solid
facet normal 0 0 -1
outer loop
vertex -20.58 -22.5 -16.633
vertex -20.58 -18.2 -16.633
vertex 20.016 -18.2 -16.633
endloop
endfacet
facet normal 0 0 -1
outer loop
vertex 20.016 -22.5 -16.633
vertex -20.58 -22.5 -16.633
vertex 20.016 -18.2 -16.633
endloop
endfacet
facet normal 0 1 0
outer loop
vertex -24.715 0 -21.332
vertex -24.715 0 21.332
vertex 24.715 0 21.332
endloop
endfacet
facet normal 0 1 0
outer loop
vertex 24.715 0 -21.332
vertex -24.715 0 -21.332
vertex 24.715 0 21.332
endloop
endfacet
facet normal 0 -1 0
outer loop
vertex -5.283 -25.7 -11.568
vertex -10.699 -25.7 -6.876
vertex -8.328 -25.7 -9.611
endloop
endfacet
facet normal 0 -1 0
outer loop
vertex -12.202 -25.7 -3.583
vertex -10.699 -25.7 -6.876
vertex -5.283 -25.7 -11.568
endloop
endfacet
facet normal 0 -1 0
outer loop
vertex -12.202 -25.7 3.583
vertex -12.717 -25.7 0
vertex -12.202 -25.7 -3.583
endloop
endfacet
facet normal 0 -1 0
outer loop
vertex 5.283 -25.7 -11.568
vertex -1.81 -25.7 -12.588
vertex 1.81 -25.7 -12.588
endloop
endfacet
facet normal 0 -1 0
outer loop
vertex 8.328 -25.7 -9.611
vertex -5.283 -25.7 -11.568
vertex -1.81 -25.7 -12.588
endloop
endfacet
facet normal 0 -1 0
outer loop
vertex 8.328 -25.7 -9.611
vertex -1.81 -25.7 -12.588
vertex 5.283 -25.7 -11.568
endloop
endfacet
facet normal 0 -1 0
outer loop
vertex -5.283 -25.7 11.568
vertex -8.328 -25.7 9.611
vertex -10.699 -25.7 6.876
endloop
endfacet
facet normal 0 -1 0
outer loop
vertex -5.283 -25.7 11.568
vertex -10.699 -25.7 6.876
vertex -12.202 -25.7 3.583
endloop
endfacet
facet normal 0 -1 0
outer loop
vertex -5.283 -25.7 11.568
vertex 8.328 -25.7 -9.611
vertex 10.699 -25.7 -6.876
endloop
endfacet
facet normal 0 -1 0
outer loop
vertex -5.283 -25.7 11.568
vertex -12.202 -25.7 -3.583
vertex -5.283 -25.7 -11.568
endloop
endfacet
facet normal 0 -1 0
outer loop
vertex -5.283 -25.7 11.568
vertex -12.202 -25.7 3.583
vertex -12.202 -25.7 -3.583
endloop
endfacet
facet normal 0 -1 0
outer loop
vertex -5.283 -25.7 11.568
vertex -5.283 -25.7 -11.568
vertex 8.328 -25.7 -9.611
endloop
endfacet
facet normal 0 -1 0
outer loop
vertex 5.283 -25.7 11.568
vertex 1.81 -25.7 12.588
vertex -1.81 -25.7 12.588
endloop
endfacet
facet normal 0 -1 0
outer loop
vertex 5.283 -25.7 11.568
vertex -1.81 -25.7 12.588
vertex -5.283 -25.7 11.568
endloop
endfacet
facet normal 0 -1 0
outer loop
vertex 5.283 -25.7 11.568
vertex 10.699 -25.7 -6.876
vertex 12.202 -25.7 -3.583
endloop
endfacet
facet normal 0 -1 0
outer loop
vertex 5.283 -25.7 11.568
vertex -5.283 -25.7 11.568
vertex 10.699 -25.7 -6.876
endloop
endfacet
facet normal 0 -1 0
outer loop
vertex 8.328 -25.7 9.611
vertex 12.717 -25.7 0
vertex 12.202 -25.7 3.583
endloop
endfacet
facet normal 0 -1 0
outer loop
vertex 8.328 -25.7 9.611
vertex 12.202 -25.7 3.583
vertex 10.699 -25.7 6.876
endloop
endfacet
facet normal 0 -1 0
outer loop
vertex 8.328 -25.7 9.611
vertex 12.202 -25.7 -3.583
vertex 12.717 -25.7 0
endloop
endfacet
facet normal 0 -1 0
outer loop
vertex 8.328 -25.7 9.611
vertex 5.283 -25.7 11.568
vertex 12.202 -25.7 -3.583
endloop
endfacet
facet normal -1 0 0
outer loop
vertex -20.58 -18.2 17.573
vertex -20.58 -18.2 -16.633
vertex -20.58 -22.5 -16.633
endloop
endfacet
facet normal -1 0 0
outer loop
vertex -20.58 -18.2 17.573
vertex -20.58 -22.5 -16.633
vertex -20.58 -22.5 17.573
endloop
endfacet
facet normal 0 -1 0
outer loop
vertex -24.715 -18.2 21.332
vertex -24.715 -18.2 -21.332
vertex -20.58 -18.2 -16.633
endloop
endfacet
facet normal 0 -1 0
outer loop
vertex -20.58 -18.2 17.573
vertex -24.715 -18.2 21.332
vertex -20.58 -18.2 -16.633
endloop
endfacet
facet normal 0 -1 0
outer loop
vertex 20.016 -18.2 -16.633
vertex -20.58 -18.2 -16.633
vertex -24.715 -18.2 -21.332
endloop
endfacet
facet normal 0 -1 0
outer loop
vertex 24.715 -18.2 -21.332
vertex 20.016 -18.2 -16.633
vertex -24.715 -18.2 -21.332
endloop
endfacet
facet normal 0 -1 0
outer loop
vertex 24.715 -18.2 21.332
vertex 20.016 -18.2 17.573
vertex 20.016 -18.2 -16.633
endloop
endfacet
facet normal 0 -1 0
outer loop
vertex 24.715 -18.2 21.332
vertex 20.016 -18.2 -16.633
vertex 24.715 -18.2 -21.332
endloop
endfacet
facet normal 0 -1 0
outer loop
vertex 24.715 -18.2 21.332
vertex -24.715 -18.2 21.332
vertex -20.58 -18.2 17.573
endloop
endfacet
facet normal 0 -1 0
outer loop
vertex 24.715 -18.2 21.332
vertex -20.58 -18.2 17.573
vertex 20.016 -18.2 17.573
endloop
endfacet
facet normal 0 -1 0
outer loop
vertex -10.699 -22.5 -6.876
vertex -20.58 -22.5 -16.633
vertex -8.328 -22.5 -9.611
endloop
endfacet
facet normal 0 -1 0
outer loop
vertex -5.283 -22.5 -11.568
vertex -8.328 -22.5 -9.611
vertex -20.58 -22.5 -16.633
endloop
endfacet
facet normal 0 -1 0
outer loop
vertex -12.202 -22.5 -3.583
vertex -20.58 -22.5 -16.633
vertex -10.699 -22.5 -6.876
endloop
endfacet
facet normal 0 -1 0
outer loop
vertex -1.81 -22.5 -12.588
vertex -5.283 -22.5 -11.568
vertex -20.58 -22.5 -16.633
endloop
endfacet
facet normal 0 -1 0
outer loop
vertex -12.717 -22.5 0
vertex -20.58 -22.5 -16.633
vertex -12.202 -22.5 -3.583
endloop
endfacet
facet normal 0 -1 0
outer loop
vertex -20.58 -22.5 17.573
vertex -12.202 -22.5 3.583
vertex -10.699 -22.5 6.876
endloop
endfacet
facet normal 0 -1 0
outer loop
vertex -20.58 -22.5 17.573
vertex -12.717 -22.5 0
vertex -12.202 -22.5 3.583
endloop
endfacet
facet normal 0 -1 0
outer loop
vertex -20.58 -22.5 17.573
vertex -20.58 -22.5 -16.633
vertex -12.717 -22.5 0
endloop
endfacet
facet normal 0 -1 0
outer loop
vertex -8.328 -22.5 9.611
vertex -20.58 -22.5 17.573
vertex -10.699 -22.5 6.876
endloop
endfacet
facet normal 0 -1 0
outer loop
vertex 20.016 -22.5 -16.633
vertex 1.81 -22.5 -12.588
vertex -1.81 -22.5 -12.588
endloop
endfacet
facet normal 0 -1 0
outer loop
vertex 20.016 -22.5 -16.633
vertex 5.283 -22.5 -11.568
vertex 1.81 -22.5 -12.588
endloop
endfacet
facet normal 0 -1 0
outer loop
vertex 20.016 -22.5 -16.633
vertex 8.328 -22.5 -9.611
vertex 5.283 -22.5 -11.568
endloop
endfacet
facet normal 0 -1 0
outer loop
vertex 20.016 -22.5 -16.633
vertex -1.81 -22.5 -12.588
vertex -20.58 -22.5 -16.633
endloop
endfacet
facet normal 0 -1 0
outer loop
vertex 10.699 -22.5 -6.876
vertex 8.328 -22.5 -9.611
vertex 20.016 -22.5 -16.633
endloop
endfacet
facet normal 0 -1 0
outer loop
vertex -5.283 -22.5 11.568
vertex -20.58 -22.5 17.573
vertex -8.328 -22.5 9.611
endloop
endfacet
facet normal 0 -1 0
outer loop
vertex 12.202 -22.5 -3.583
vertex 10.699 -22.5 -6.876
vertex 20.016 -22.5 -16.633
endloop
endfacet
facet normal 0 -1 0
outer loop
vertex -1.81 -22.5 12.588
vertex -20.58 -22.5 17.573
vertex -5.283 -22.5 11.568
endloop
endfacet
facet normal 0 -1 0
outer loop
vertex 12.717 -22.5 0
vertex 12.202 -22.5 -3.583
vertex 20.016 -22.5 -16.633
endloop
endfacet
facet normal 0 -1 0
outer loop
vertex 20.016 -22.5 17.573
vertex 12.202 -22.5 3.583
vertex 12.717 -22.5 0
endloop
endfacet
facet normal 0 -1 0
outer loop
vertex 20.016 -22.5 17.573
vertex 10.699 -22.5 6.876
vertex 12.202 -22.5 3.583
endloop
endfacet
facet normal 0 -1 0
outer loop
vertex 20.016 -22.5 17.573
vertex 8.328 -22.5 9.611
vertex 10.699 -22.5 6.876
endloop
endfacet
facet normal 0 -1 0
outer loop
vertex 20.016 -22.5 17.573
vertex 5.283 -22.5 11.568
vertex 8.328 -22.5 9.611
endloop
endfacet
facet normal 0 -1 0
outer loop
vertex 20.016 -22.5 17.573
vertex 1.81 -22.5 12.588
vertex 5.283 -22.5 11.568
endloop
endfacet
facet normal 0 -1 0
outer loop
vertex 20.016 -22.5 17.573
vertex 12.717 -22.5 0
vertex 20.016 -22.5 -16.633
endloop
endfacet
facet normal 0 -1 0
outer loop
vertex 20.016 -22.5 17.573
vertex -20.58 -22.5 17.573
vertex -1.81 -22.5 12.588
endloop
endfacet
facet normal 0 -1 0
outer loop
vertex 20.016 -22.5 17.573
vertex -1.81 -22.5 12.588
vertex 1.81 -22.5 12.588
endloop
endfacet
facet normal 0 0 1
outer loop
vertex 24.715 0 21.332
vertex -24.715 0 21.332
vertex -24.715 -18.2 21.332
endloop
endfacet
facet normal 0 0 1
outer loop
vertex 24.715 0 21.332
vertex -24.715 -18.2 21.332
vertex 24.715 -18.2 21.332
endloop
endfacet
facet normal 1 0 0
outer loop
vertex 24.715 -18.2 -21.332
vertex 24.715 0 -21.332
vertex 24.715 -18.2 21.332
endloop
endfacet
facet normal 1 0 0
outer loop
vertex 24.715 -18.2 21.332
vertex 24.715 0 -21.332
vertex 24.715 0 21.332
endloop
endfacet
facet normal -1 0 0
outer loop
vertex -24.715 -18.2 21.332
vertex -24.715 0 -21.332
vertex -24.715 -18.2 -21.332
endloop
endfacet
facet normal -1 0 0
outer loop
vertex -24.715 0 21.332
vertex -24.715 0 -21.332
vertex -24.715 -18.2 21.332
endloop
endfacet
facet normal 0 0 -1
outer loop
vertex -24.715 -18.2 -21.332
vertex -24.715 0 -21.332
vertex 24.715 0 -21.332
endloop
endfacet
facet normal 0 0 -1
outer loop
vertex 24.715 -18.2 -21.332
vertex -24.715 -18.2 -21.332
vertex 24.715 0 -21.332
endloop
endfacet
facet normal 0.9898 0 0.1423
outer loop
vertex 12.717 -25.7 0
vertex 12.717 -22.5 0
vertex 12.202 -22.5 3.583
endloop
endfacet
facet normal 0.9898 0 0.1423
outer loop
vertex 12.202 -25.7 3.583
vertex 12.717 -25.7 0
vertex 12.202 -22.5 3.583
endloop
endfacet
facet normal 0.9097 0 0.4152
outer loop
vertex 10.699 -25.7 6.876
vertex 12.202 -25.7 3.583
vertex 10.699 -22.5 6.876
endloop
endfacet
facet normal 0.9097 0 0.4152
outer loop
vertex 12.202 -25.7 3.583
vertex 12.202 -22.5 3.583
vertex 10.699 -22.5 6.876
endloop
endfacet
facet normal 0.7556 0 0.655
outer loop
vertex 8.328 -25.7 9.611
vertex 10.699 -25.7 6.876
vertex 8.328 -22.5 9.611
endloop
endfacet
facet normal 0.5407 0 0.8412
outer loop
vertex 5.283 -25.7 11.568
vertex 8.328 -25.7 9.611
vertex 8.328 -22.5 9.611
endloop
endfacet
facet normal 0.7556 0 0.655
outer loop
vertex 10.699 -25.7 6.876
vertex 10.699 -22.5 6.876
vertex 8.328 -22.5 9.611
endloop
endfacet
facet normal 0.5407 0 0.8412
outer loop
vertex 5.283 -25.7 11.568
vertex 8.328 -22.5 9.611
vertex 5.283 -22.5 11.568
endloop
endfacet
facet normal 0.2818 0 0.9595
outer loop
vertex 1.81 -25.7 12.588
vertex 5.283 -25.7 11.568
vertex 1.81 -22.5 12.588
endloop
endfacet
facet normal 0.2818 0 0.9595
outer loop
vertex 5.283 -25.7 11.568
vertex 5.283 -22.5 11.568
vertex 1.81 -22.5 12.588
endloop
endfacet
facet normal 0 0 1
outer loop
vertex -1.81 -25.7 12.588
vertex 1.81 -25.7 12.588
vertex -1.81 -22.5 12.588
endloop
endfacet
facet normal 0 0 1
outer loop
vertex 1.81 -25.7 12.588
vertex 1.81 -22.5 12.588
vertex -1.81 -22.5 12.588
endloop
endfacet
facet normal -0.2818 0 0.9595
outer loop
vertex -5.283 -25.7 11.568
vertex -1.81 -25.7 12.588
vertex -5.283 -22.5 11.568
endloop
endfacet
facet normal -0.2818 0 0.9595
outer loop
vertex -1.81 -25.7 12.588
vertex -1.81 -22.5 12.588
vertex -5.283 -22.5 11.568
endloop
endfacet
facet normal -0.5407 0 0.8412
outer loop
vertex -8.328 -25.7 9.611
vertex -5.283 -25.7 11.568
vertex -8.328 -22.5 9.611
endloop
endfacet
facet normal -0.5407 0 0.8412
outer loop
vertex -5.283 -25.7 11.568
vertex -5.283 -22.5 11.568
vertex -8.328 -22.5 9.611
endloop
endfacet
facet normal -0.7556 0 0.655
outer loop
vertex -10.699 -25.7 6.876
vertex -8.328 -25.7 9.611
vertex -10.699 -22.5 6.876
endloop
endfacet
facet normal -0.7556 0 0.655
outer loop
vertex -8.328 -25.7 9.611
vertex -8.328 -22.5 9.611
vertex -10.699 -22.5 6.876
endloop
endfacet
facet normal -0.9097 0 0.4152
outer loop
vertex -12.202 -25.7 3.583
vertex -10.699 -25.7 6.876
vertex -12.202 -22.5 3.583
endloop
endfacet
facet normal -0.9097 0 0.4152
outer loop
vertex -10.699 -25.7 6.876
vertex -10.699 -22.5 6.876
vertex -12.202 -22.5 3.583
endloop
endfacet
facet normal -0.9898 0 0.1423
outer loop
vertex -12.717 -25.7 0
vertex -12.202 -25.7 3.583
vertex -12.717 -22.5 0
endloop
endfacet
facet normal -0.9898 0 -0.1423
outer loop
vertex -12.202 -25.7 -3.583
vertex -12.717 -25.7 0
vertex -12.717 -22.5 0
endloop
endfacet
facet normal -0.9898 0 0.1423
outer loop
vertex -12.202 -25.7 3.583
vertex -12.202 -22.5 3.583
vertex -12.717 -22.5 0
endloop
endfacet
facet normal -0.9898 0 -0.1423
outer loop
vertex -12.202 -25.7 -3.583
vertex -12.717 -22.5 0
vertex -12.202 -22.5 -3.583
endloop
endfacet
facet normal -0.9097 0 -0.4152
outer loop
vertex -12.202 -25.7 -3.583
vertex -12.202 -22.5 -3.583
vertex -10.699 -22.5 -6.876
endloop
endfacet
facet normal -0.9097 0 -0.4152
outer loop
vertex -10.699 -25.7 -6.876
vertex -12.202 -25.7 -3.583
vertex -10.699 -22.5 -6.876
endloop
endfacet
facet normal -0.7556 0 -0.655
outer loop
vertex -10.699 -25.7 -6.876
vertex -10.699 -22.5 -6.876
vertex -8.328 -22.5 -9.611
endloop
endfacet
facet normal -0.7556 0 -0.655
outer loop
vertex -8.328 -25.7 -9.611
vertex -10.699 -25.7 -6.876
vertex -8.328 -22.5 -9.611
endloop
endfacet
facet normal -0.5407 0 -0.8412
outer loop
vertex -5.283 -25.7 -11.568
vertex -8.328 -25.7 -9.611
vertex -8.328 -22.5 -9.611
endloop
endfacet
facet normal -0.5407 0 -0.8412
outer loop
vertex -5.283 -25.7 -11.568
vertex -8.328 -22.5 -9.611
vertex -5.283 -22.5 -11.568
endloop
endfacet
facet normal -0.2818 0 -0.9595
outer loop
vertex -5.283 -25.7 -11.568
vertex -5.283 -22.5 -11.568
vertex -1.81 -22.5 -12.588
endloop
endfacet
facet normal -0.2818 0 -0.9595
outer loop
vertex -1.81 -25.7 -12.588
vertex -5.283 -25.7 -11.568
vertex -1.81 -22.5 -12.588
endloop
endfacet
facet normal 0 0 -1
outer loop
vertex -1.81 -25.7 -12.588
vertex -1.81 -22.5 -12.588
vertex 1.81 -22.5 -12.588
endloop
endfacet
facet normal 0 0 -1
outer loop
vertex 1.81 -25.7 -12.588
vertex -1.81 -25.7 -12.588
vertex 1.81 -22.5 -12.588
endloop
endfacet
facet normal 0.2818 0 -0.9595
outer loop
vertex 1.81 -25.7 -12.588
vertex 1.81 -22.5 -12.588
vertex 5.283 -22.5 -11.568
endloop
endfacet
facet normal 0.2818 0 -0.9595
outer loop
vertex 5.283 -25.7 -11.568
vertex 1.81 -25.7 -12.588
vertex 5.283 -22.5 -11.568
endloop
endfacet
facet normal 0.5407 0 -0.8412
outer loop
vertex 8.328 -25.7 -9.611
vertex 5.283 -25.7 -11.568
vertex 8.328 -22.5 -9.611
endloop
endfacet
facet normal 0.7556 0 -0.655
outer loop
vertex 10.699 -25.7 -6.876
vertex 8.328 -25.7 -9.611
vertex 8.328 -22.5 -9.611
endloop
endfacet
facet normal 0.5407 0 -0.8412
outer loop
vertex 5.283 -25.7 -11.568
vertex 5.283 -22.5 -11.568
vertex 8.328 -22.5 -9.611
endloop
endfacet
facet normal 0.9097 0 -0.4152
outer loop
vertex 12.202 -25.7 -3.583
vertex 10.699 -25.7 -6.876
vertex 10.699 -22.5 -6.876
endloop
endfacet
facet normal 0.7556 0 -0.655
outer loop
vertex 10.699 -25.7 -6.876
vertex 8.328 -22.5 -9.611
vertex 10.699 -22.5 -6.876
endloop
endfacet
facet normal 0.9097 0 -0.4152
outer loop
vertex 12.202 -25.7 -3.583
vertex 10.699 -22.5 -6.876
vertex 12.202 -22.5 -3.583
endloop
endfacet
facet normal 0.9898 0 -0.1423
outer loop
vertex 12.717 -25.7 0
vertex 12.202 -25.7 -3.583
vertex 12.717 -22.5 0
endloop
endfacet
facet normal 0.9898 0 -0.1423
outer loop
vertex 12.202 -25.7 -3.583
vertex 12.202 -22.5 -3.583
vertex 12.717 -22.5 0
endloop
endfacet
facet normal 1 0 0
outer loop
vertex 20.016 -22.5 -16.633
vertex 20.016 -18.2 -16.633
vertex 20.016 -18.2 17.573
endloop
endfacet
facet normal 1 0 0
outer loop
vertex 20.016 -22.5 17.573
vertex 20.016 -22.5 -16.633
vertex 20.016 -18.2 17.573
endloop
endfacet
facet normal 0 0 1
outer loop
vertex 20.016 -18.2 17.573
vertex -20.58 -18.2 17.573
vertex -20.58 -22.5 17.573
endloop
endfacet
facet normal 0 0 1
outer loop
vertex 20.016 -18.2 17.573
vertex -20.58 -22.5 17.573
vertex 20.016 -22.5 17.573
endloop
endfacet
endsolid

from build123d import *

# Parameters (mm, degrees)
F0_W     = 49.430196
F0_H     = 42.66408
F1_DEPTH = 18.2
F2_W     = 40.59666
F2_H     = 34.206446
F3_DEPTH = 4.3
F4_R     = 12.717394
F5_DEPTH = 3.2


with BuildPart() as f1:
    # F0 (on Front) → F1 (new body)
    with BuildSketch(Plane.XZ):
        Rectangle(F0_W, F0_H)
    extrude(amount=F1_DEPTH)

    # F2 (on face) → F3 (join)
    with BuildSketch(Plane.XZ.offset(18.2)):
        with Locations((-0.281921, 0.469869)):
            Rectangle(F2_W, F2_H)
    extrude(amount=F3_DEPTH)

    # F4 (on face) → F5 (join)
    with BuildSketch(Plane.XZ.offset(22.5)):
        Circle(F4_R)
    extrude(amount=F5_DEPTH)


solid = f1.part
